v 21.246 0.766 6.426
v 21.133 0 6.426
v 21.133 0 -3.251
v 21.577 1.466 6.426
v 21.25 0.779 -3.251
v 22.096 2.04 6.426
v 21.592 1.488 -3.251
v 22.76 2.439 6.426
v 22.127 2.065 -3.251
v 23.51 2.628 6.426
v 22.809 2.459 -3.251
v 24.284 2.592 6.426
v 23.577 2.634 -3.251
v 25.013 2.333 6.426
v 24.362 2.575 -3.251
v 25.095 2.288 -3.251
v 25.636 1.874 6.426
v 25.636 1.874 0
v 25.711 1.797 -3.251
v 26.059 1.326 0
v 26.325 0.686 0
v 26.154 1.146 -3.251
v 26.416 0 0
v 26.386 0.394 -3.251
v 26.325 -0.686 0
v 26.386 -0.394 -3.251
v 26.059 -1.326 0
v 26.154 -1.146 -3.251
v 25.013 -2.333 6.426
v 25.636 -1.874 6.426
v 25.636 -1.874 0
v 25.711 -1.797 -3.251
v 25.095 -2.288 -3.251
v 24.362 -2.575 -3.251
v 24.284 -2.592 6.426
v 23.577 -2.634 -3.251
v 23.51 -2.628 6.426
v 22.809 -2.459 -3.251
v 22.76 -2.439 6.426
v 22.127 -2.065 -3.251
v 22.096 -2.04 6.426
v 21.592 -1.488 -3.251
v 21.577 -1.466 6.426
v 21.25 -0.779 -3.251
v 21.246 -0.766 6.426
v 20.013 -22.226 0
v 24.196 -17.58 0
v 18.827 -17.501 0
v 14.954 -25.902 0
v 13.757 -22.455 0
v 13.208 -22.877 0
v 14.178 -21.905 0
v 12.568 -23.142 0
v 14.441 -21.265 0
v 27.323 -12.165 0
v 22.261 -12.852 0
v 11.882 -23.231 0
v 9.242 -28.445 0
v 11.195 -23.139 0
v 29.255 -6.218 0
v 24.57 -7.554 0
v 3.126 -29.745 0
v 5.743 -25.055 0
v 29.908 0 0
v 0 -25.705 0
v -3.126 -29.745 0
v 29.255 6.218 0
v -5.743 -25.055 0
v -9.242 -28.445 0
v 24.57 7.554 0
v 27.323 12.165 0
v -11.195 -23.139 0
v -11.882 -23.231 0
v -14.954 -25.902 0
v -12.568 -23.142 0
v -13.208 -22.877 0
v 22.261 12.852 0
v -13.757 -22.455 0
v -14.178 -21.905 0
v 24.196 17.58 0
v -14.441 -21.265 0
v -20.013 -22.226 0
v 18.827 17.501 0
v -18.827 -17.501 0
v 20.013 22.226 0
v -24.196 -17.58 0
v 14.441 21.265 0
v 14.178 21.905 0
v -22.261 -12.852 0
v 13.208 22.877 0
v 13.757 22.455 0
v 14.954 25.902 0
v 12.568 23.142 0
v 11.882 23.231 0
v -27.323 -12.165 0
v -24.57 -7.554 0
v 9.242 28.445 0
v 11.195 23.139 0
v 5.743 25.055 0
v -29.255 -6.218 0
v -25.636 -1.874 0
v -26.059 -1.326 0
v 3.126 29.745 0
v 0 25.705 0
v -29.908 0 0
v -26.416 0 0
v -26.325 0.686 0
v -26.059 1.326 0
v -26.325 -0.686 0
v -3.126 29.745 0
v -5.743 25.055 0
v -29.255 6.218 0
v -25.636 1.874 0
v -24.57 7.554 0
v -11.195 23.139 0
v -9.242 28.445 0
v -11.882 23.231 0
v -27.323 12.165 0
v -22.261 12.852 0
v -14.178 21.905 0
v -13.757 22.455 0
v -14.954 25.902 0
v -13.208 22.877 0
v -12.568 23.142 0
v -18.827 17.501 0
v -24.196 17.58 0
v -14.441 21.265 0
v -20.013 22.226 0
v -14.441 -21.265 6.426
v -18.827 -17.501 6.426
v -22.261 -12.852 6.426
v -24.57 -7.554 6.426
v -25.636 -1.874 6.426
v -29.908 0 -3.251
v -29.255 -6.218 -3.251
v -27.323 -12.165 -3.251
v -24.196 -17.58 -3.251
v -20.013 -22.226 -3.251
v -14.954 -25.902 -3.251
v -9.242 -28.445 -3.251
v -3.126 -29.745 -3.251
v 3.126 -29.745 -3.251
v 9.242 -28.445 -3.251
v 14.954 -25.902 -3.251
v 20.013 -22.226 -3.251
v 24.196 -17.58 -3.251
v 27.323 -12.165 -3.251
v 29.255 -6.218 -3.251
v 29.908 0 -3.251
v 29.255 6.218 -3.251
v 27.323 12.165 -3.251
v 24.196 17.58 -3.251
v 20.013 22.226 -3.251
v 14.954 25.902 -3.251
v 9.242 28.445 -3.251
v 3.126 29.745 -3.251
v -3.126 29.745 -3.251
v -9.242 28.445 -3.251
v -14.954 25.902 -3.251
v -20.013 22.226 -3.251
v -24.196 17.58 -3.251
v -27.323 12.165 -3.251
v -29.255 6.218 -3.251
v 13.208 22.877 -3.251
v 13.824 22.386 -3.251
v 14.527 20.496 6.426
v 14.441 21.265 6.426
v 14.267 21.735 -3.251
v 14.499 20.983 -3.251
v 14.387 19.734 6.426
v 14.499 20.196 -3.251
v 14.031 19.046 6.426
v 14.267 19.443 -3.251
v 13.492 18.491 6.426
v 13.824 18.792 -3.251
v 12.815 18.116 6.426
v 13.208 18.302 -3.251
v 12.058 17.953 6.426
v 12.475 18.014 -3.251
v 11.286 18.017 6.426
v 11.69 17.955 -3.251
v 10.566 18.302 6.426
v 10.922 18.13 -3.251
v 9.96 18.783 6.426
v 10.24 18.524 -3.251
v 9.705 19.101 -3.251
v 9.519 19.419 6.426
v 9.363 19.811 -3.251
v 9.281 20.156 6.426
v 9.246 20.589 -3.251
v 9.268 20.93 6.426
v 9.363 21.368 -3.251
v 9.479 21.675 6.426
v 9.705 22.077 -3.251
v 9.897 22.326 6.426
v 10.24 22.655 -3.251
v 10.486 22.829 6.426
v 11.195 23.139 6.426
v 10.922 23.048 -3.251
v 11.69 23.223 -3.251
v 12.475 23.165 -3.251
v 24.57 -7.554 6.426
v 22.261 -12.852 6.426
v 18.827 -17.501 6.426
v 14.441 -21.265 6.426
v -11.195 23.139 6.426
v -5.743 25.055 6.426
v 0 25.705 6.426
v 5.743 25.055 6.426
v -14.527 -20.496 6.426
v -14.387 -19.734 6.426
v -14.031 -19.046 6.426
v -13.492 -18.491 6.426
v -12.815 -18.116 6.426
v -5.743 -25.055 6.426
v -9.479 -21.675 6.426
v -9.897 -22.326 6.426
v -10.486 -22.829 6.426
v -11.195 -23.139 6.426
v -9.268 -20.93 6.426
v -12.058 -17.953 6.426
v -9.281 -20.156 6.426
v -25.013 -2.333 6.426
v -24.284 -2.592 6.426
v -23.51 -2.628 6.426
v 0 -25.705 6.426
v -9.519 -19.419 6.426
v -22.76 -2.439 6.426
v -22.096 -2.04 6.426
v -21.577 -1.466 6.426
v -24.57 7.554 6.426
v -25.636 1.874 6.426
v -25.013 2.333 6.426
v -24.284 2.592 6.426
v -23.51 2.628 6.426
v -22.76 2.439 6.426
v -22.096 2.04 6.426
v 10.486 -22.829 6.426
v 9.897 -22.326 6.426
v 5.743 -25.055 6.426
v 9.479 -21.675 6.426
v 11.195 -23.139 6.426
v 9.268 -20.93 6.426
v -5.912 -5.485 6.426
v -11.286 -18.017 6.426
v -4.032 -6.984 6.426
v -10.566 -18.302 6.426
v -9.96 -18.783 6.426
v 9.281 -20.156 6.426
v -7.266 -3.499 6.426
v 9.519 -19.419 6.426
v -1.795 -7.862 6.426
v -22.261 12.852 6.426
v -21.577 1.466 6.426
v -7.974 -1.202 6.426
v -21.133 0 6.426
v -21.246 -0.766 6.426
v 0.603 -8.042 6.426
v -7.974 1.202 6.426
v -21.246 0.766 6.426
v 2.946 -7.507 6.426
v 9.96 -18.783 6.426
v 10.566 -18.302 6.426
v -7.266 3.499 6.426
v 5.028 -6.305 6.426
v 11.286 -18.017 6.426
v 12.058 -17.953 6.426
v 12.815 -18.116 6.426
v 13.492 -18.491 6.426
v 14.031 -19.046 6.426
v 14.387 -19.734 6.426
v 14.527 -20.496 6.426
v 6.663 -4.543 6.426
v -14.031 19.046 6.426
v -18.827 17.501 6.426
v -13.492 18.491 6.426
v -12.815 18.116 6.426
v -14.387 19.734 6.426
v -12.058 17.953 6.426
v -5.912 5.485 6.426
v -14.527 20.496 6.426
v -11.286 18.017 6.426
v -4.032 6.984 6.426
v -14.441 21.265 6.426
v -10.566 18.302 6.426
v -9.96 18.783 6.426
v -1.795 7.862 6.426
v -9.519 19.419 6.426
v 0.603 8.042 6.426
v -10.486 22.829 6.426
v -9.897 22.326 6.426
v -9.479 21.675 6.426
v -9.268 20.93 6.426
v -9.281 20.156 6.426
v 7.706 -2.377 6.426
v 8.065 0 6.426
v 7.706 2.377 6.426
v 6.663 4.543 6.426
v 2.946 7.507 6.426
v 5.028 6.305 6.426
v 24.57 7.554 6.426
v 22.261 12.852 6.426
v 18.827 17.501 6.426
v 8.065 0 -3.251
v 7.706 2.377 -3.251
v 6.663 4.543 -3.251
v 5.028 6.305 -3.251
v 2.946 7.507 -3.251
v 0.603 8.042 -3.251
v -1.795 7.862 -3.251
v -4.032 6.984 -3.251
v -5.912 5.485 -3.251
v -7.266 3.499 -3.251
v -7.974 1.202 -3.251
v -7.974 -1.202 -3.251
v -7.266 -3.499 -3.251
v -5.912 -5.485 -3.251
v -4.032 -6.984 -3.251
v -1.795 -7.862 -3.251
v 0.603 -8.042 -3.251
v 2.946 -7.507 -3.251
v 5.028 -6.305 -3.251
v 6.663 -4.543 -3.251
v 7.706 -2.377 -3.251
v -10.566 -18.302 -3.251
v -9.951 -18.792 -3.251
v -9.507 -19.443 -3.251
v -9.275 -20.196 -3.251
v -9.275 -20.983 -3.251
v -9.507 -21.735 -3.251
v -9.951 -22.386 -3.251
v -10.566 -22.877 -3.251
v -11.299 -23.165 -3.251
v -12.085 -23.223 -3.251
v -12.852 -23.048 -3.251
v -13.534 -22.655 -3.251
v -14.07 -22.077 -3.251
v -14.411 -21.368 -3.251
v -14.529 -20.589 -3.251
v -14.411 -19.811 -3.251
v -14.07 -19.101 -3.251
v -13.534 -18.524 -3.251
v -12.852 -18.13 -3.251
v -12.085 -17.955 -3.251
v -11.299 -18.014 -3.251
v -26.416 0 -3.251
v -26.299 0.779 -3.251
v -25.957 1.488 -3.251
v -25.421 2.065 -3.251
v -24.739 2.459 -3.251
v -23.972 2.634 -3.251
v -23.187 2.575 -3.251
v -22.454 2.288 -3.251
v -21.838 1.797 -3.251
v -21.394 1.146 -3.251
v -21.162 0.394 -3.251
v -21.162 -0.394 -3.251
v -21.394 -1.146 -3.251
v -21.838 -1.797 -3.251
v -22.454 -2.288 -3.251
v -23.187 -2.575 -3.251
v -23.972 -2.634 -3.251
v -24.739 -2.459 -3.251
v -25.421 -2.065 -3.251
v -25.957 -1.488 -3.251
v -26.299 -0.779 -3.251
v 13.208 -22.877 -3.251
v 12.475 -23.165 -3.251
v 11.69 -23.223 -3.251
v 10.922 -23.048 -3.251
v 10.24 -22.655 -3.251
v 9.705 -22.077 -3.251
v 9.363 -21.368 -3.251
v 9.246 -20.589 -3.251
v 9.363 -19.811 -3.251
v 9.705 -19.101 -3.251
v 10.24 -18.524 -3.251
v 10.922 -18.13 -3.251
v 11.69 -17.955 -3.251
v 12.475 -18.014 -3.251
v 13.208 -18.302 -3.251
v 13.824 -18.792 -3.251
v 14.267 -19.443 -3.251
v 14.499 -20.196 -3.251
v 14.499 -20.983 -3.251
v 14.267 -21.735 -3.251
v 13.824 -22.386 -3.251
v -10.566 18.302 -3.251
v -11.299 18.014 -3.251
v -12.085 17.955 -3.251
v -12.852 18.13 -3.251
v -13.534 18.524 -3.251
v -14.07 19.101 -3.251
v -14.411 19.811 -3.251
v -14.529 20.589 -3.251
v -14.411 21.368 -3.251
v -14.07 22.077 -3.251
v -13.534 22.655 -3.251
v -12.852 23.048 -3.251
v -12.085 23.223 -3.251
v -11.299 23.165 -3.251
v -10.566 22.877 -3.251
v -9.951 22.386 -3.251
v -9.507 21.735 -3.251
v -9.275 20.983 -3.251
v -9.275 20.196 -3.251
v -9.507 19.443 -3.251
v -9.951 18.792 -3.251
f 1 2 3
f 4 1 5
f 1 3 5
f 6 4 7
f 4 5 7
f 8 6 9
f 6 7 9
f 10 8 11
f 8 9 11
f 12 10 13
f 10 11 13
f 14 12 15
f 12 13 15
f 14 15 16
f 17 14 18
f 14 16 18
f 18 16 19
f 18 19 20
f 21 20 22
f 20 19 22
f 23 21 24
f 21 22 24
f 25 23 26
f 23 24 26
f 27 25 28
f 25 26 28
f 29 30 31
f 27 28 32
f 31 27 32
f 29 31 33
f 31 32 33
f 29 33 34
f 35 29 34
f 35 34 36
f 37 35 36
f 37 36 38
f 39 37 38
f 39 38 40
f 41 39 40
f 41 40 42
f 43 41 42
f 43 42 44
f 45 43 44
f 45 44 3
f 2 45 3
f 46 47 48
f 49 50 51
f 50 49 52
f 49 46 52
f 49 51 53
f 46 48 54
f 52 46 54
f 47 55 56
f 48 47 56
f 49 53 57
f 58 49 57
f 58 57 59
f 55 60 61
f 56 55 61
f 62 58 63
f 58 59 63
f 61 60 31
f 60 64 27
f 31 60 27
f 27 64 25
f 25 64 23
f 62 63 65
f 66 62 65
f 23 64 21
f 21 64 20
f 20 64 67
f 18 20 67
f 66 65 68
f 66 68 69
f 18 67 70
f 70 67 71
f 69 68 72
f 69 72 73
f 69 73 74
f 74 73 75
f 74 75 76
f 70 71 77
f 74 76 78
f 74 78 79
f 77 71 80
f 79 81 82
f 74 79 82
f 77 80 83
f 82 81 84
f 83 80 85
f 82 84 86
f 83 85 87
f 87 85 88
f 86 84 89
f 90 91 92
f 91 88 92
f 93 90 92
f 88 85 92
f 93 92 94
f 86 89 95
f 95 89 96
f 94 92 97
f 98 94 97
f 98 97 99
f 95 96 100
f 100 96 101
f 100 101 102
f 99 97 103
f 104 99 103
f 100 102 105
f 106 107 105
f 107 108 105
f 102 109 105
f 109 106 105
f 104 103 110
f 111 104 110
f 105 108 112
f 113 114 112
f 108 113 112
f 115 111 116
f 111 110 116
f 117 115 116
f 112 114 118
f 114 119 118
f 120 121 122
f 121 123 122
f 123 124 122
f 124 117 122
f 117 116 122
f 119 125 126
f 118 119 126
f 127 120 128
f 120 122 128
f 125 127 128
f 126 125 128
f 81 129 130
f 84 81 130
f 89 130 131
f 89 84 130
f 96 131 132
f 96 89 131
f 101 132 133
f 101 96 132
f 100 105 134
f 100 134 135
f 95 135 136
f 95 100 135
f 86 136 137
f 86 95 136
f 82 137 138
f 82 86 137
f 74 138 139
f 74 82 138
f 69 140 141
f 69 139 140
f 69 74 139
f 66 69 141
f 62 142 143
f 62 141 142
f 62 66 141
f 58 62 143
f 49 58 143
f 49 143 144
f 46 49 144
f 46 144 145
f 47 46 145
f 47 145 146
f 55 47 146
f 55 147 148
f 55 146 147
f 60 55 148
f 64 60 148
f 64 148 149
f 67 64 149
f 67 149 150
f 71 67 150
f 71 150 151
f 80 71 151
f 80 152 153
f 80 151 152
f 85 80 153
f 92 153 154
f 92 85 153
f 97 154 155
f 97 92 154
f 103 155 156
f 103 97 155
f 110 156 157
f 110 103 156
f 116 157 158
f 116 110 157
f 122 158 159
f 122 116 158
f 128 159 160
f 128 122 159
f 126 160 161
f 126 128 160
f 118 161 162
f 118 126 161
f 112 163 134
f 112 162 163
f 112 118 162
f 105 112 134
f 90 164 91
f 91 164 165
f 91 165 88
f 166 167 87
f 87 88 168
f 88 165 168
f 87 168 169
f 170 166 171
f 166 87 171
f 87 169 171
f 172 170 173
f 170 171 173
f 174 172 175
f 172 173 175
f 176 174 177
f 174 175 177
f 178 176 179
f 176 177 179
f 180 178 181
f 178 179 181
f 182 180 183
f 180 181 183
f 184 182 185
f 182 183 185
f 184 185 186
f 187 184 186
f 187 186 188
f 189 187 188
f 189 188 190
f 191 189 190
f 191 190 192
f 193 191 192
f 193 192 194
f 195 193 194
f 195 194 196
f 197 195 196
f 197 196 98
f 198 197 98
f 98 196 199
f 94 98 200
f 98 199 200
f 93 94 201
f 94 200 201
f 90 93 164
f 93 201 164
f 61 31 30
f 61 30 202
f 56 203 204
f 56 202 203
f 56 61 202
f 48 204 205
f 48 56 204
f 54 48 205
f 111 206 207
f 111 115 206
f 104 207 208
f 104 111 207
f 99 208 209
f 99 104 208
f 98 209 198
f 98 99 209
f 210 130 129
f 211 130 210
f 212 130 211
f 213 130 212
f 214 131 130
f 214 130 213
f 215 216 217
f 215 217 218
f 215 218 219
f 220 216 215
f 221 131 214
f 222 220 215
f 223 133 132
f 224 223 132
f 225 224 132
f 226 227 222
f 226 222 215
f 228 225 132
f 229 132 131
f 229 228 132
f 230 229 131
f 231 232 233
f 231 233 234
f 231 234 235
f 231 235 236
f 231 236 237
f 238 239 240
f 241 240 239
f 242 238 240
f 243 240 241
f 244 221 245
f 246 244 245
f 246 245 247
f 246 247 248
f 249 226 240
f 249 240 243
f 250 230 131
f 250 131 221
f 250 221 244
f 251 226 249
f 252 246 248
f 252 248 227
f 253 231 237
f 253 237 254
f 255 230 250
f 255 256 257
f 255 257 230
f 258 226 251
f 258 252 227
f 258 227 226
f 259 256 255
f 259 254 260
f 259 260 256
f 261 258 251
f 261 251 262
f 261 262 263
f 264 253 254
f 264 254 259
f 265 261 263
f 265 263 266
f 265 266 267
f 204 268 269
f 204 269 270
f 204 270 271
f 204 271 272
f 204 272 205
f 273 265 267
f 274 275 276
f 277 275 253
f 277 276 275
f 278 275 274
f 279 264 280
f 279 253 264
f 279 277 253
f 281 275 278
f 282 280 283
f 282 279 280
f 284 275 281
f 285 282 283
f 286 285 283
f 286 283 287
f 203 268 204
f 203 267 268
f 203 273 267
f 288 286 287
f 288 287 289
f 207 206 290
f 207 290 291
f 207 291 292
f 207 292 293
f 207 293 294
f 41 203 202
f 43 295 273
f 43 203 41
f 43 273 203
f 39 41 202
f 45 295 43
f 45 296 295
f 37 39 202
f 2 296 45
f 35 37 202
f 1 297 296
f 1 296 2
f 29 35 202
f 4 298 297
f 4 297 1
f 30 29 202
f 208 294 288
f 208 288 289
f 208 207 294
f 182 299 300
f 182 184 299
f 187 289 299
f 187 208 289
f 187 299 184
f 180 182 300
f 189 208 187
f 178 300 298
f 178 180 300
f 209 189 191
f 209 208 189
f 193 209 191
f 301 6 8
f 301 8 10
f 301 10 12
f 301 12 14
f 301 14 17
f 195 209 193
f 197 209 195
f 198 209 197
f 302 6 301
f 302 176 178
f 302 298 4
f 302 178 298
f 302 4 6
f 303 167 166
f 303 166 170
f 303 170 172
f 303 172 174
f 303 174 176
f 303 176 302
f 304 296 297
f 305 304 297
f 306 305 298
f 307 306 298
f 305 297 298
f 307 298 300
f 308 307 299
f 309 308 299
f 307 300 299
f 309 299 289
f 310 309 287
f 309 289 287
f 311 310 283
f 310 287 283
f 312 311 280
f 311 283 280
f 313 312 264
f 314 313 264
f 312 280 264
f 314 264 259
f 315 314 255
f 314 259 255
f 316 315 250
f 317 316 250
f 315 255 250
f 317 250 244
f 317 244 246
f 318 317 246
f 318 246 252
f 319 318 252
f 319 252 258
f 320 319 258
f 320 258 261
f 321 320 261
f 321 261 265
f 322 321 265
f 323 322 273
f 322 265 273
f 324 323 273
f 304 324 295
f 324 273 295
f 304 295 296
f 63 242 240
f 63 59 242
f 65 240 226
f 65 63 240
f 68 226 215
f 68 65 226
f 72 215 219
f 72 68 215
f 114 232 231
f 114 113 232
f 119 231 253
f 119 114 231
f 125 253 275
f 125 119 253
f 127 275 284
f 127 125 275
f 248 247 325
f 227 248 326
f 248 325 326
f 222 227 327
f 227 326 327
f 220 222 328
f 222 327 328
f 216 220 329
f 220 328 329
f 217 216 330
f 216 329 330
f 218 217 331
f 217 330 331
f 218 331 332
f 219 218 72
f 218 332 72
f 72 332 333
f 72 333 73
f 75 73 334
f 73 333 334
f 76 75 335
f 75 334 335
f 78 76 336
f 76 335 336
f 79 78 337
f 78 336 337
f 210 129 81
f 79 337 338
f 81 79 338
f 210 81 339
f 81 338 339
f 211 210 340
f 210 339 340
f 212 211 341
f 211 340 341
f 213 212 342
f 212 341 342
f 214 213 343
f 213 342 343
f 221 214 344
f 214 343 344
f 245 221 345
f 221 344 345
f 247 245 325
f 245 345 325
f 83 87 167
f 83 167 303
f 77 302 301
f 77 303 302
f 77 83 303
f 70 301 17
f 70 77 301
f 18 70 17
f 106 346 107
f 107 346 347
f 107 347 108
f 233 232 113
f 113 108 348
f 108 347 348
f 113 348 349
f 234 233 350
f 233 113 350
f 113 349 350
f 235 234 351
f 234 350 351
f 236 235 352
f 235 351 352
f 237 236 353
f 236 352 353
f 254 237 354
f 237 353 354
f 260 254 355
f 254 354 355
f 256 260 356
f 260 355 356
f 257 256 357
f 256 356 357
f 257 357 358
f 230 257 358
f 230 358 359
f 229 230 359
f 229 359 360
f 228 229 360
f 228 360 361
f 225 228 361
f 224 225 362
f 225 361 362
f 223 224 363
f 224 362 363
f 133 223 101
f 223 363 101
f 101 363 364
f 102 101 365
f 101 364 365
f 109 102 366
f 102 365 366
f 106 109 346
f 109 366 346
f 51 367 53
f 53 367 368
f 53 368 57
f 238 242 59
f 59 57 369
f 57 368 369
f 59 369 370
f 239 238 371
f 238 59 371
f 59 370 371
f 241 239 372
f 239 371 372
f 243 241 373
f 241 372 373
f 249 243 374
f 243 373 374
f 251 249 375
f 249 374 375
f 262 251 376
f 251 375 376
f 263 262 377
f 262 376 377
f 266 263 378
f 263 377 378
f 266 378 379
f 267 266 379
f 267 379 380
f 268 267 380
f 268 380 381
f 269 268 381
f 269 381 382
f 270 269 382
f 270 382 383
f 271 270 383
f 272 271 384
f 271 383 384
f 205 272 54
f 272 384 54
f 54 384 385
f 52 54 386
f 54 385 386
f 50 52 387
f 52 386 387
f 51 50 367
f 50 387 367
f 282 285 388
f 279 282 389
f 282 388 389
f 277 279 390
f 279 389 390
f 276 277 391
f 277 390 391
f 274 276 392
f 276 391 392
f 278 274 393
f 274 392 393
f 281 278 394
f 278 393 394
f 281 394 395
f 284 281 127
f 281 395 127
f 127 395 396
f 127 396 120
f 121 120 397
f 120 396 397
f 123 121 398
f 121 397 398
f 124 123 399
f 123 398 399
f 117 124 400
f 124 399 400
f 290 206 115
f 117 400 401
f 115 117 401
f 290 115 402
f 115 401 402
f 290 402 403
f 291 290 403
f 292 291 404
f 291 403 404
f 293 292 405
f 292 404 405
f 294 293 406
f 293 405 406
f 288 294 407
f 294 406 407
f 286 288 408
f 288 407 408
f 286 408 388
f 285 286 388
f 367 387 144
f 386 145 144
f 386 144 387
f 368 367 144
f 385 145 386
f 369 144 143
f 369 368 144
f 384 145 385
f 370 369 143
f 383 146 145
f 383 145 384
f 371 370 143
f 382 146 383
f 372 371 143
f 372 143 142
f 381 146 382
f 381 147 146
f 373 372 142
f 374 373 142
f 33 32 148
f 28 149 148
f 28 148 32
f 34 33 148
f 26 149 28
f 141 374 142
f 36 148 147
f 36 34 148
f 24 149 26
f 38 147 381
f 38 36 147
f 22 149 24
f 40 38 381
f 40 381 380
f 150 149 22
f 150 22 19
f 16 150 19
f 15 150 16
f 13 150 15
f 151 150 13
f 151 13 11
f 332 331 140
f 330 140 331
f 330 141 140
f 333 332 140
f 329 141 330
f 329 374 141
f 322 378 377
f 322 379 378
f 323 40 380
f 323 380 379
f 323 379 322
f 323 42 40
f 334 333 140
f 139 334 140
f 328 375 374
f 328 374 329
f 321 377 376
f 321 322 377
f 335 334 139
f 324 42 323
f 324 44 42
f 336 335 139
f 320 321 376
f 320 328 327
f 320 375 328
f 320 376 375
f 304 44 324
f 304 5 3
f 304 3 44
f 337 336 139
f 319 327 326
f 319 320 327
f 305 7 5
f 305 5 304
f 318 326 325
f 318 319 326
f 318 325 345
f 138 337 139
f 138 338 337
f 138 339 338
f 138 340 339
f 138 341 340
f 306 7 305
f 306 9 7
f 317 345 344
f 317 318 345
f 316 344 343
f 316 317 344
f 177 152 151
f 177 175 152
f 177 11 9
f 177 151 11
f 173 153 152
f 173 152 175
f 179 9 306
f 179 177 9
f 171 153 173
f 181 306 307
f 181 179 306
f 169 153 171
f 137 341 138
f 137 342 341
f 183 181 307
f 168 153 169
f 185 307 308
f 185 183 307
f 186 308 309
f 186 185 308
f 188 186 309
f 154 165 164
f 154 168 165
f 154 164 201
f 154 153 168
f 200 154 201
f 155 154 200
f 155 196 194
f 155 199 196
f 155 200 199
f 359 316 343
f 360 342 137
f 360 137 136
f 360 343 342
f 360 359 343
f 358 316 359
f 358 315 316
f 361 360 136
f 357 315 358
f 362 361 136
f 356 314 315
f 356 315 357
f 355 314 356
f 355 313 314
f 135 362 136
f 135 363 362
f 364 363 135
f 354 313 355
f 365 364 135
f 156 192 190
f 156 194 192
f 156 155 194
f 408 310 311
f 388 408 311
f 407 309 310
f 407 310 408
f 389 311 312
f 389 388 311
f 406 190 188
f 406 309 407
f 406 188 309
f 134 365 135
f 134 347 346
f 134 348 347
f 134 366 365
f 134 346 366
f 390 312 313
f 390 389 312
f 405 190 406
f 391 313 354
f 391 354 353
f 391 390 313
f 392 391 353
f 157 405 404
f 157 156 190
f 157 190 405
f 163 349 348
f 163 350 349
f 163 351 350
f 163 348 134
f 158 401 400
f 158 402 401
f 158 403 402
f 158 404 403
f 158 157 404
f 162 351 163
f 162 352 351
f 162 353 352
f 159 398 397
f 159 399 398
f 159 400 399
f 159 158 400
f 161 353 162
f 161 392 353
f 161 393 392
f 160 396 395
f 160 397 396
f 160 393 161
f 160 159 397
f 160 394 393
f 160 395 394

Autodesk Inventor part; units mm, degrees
ref_plane "YZ Plane" through (0, 0, 0) normal (1, 0, 0) x (0, 1, 0)
ref_plane "XZ Plane" through (0, 0, 0) normal (0, 1, 0) x (-1, 0, 0)
ref_plane "XY Plane" through (0, 0, 0) normal (0, 0, 1) x (1, 0, 0)
sketch "Sketch1" plane through (0, 0, 0) normal (0, 0, 1) x (1, 0, 0)
  circle A0 centre (0, 0) radius 25.7048
  dimension "d0" = 51.4096
extrude "Extrusion1" add sketch "Sketch1" along normal blind 6.4262
sketch "Sketch2" plane through (0, 0, 6.4262) normal (0, 0, 1) x (1, 0, 0)
  circle A0 centre (0, 0) radius 8.0645
  dimension "d3" = 16.129
extrude "Extrusion2" cut sketch "Sketch2" against normal blind 127
sketch "Sketch3" plane through (0, 0, 0) normal (0, 0, -1) x (-1, 0, 0)
  circle A0 centre (0, 0) radius 29.9085
  dimension "d6" = 59.817
extrude "Extrusion3" add sketch "Sketch3" along normal blind 3.2512
sketch "Sketch4" plane through (0, 0, 6.4262) normal (0, 0, 1) x (1, 0, 0)
  circle A0 centre (0, 0) radius 8.0645
extrude "Extrusion4" cut sketch "Sketch4" against normal blind 127
sketch "Sketch5" plane through (0, 0, -3.2512) normal (0, 0, -1) x (-1, 0, 0)
  circle A0 centre (23.7744, 0) radius 2.6416
  circle A1 centre (-23.7744, 0) radius 2.6416
  circle A2 centre (0, 0) radius 29.9085 projected
  circle A3 centre (0, 0) radius 8.0645 projected
  line L0 (0, 8.0645) -> (0, -8.0645) construction
  dimension "d11" = 5.2832
  dimension "d12" = 42.2656
extrude "Extrusion5" cut sketch "Sketch5" against normal through all contours A0 | A1
pattern_circular "Circular Pattern1" count 3 over 360 about axis through (0, 0, 6.4262) along (0, 0, -1) of "Extrusion5"
